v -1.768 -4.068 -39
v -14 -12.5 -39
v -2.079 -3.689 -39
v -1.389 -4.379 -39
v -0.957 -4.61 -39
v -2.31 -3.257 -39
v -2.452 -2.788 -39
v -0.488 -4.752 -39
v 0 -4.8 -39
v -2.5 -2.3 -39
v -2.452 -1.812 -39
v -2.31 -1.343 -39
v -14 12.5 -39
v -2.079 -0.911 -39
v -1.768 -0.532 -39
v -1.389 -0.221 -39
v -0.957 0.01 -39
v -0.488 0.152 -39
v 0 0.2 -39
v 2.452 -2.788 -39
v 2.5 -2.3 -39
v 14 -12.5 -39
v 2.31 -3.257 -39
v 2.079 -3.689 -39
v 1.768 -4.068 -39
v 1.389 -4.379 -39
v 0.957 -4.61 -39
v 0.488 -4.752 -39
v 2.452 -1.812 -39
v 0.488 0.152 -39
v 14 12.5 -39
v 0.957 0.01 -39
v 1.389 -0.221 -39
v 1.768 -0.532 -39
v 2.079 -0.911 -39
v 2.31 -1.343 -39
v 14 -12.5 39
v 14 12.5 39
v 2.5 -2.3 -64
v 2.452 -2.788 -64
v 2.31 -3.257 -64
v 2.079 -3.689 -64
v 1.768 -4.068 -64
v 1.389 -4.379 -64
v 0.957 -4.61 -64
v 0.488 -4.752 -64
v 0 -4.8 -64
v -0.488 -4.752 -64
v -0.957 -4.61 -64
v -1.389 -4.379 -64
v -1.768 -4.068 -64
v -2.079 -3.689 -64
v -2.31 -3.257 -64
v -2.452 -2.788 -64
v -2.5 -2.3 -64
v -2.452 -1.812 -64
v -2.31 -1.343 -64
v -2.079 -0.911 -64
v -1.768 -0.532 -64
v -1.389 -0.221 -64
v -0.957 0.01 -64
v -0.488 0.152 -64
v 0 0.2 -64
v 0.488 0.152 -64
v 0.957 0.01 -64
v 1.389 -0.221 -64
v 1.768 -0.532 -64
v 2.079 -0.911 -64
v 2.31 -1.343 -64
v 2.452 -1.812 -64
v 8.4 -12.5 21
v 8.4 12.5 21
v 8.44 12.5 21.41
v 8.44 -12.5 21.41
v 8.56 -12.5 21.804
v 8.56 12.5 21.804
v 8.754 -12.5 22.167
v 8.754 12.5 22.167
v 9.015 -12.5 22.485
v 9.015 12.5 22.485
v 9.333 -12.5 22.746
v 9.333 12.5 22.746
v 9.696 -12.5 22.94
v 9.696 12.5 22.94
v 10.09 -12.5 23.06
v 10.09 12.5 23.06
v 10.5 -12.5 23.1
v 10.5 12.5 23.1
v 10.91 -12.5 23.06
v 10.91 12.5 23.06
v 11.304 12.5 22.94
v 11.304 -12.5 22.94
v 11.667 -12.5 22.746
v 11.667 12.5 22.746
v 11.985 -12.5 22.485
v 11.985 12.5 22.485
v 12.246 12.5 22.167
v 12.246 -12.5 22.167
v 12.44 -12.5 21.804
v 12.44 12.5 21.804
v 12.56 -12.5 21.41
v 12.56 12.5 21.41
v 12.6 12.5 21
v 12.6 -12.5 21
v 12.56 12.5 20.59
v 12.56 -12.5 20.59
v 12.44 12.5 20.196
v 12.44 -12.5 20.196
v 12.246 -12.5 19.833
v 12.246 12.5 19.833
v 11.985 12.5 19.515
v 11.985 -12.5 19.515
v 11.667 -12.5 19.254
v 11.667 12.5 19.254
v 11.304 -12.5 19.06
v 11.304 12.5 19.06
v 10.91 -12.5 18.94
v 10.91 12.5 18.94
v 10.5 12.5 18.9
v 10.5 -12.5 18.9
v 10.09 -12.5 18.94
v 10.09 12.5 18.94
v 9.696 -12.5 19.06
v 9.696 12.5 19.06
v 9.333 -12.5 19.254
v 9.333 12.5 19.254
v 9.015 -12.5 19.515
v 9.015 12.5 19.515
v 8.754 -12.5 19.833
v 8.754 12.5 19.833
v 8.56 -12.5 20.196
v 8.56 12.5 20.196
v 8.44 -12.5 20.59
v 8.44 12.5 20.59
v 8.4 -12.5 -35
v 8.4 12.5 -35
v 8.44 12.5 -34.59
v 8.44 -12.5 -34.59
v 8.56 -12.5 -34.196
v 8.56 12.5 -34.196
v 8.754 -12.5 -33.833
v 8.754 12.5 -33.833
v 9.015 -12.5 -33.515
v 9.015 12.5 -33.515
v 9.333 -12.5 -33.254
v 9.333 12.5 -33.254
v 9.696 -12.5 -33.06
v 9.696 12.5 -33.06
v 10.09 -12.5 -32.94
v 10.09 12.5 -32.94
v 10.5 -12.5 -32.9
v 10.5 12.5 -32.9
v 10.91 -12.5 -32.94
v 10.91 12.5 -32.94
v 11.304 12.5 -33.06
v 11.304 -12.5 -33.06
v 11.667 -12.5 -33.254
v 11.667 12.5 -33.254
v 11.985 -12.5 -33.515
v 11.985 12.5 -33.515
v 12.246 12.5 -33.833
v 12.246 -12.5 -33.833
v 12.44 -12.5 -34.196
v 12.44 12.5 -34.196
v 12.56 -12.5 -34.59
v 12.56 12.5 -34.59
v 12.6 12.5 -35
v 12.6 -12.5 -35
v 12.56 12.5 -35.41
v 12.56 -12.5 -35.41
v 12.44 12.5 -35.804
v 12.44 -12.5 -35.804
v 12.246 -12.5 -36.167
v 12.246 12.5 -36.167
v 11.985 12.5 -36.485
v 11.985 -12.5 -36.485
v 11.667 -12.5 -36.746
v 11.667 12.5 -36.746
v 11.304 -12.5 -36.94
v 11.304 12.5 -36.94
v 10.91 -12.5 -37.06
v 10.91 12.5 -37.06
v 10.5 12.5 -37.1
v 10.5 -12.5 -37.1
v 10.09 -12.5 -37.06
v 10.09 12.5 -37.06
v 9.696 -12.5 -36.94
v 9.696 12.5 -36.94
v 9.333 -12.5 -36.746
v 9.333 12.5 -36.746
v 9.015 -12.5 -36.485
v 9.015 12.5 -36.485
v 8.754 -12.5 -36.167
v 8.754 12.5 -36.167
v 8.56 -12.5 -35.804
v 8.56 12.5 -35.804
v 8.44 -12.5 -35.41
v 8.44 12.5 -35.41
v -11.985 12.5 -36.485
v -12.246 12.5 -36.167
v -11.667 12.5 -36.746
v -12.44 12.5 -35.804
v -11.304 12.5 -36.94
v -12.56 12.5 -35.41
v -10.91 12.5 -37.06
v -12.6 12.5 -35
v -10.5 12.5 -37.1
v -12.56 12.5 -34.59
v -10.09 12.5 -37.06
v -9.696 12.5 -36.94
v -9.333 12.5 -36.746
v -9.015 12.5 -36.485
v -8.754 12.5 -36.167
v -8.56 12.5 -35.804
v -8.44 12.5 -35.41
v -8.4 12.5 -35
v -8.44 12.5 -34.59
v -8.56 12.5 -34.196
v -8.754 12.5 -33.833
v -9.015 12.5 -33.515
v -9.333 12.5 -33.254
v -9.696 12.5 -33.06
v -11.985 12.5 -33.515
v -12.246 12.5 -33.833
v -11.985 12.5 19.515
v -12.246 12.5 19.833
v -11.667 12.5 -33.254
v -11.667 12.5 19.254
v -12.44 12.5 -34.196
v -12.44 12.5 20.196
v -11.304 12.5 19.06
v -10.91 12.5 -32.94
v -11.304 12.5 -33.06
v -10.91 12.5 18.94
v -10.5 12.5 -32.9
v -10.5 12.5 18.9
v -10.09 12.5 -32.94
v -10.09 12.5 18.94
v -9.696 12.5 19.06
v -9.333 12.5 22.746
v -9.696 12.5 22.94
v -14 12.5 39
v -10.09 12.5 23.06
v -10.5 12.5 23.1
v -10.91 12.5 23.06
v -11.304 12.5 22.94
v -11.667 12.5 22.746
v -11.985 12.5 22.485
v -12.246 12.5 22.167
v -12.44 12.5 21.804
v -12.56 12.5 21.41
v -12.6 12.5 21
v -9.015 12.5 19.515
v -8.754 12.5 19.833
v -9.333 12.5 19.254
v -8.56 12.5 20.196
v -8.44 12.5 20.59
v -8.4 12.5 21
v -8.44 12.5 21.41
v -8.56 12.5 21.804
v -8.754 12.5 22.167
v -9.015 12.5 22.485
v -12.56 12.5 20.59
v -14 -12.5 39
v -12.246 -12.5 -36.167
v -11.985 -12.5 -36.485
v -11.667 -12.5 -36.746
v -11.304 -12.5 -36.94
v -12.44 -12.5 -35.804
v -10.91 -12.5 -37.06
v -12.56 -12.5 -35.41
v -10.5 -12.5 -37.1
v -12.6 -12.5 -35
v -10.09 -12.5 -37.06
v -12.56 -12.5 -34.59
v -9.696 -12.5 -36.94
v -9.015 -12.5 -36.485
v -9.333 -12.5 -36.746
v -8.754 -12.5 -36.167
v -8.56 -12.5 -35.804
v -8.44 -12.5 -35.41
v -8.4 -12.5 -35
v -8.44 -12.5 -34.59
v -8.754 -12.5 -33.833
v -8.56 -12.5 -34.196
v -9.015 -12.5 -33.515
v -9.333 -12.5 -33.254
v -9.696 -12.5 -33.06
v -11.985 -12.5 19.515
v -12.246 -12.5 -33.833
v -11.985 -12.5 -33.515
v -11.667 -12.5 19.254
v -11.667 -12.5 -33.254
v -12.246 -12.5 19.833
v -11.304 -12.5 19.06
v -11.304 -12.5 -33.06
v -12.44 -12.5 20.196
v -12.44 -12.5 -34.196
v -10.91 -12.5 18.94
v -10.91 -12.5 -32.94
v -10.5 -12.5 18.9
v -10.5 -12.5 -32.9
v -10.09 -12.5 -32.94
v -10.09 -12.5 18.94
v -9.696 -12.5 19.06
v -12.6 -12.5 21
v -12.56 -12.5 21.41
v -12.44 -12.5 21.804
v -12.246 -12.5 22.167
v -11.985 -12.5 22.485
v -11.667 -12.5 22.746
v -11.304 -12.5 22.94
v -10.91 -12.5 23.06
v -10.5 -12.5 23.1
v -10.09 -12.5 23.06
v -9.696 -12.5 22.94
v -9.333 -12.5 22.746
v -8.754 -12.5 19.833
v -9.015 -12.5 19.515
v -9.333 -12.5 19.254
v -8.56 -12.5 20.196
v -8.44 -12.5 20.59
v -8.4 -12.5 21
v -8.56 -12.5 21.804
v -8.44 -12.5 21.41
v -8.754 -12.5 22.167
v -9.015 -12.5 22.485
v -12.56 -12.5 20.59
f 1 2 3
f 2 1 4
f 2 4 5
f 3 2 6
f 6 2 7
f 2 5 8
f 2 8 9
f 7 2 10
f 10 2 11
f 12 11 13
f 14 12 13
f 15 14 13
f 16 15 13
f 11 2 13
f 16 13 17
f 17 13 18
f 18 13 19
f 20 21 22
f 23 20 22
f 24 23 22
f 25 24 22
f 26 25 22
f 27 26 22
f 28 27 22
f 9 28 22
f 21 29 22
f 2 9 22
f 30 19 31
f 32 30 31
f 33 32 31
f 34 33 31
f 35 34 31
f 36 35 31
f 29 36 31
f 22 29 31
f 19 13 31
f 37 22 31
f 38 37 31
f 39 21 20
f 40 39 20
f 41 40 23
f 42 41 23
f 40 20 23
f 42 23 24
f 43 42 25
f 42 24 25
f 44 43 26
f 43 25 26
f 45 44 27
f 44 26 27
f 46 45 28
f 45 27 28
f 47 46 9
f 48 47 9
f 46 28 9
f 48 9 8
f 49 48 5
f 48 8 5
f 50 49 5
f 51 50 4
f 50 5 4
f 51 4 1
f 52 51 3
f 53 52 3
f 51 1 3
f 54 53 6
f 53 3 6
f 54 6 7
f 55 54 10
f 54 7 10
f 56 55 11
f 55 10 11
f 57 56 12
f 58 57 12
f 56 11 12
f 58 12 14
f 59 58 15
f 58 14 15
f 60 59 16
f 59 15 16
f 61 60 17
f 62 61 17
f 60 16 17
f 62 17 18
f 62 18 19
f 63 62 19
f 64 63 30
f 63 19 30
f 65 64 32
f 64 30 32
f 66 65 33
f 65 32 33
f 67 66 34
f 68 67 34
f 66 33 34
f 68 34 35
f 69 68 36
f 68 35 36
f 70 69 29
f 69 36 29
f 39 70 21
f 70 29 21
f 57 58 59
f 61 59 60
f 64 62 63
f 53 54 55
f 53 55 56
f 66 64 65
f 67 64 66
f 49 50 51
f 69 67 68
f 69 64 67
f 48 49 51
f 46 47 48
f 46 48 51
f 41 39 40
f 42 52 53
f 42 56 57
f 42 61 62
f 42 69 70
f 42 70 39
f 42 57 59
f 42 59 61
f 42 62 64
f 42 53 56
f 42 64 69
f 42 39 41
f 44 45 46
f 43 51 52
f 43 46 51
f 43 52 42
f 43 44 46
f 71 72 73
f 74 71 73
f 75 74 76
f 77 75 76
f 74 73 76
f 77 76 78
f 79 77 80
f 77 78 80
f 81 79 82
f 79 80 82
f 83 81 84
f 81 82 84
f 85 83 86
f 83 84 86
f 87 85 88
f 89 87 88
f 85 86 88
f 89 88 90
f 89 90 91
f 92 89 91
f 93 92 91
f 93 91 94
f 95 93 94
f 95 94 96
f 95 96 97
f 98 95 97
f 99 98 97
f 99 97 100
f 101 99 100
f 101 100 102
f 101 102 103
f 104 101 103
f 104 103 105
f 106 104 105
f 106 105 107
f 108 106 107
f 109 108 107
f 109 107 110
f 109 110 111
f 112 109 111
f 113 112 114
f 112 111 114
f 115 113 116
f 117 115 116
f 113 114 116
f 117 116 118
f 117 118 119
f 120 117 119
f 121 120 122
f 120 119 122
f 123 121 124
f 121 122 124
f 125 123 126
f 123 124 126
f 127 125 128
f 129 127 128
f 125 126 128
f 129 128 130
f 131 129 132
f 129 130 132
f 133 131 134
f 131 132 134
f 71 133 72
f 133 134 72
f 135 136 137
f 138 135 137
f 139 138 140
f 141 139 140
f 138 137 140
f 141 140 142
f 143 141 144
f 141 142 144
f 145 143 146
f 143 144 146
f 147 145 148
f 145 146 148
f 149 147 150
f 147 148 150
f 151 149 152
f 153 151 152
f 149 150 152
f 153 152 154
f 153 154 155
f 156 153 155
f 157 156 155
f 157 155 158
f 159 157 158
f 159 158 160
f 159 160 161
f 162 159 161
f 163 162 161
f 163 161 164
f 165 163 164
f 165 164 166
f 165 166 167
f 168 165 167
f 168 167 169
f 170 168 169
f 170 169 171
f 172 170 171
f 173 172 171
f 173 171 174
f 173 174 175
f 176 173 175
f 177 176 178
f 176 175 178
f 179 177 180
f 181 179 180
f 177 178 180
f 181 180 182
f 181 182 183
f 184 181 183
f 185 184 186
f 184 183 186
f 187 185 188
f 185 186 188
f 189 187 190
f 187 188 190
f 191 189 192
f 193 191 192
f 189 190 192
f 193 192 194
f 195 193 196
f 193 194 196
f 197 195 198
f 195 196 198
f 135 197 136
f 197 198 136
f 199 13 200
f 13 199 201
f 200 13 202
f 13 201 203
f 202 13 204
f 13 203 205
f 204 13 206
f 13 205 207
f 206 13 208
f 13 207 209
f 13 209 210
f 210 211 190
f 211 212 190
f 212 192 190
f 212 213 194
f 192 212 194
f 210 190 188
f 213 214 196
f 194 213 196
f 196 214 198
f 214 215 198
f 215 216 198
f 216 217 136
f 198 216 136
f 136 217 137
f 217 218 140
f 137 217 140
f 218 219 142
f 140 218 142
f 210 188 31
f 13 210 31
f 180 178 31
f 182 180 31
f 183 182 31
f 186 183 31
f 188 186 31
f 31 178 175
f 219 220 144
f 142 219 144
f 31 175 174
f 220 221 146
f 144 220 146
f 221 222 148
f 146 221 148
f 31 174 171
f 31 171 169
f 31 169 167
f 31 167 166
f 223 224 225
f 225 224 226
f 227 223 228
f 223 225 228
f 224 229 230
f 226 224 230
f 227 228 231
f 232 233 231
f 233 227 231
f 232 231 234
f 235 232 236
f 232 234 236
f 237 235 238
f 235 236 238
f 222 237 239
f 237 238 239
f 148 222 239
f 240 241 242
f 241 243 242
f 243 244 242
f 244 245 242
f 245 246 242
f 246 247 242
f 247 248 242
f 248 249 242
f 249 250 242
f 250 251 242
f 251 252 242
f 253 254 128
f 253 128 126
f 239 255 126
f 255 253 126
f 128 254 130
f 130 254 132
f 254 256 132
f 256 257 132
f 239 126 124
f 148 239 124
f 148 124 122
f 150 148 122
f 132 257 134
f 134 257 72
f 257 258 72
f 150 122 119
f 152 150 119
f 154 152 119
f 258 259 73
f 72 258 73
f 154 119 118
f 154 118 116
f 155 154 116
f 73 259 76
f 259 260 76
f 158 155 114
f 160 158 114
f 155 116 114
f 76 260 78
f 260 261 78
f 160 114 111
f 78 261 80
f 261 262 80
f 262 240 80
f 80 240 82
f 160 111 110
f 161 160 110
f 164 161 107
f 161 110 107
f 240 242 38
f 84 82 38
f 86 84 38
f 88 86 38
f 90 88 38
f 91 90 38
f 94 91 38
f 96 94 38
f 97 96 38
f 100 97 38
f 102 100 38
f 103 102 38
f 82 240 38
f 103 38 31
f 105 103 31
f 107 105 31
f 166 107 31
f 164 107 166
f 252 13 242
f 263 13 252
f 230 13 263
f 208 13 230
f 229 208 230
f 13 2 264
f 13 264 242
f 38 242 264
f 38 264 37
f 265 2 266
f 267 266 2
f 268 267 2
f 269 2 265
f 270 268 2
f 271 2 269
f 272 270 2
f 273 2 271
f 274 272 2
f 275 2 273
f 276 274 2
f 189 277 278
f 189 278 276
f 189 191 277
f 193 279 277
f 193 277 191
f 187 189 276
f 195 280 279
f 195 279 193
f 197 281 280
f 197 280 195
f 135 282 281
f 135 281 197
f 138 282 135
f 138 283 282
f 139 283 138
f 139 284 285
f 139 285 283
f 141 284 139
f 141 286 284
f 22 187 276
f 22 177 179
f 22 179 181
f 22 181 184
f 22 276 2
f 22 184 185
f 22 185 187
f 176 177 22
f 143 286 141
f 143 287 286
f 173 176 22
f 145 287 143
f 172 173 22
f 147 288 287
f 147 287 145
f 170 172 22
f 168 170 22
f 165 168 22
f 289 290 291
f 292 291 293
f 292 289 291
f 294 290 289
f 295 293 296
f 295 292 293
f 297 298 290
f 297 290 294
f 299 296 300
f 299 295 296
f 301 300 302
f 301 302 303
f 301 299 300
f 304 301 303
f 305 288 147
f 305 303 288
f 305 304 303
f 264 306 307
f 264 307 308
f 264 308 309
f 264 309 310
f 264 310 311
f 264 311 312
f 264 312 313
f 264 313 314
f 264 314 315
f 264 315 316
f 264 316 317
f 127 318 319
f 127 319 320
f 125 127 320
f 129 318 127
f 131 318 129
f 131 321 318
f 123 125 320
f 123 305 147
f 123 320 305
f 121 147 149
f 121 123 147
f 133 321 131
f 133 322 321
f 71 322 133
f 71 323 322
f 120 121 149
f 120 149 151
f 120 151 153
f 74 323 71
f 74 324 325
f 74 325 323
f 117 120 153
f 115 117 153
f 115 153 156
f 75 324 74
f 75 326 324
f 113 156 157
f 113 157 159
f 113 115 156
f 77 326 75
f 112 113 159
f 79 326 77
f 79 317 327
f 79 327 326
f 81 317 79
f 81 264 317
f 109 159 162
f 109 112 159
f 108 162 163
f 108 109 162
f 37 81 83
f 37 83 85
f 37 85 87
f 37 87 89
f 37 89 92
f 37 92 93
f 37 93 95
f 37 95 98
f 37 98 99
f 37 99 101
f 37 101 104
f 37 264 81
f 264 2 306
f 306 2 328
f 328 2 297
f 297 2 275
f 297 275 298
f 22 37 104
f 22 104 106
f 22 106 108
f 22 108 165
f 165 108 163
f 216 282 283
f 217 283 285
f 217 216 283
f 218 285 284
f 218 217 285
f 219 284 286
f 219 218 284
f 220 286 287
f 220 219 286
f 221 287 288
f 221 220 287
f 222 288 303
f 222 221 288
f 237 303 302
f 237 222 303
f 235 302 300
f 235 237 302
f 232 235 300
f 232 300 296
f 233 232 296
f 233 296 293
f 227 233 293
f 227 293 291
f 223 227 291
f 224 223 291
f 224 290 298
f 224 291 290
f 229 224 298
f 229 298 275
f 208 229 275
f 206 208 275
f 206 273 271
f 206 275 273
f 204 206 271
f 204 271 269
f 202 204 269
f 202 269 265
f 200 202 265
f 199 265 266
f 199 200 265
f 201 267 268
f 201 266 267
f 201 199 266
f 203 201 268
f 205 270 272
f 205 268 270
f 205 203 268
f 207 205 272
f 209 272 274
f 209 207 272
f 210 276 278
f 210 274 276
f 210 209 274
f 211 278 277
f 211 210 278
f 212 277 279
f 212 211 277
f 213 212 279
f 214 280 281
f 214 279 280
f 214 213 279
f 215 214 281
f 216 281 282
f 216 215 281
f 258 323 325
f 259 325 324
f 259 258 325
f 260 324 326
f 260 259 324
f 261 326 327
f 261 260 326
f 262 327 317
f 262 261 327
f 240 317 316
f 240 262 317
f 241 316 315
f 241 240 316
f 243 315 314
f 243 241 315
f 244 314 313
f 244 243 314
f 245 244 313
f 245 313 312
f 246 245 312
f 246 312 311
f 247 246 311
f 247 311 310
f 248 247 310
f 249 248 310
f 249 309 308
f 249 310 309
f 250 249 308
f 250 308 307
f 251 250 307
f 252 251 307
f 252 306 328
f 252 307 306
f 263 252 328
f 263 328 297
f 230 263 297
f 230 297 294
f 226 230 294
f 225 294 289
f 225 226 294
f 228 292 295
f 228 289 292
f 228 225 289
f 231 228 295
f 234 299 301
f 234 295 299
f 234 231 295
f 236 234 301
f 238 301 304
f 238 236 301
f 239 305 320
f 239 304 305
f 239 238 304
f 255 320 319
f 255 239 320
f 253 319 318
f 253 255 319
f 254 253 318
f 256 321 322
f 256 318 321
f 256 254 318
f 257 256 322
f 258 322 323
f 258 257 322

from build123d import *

# Parameters (mm, degrees)
SKETCH1_W           = 28
SKETCH1_H           = 25
BOSS_EXTRUDE1_DEPTH = 39
SKETCH2_R           = 2.1
CUT_EXTRUDE1_DEPTH  = 49.39421453
SKETCH3_R           = 2.5
BOSS_EXTRUDE2_DEPTH = 25


with BuildPart() as part:
    # Sketch1 → Boss-Extrude1 (new, symmetric)
    with BuildSketch(Plane.XY):
        Rectangle(SKETCH1_W, SKETCH1_H)
    extrude(amount=BOSS_EXTRUDE1_DEPTH, both=True)

    # Sketch2 → Cut-Extrude1 (cut, through all)
    with BuildSketch(Plane(origin=(0, 12.5, 0), x_dir=(1, 0, 0), z_dir=(0, 1, 0))):
        with Locations(Location((10.5, 35, 0), (0, 0, 180))):
            Circle(SKETCH2_R)
        with Locations(Location((10.5, -21, 0), (0, 0, 180))):
            Circle(SKETCH2_R)
    cut_extrude1 = extrude(amount=-CUT_EXTRUDE1_DEPTH, mode=Mode.SUBTRACT)

    # Mirror1: Cut-Extrude1 across plane
    add(cut_extrude1.mirror(Plane(origin=(0, 0, 0), x_dir=(0, 0, 1), z_dir=(1, 0, 0))), mode=Mode.SUBTRACT)

    # Sketch3 → Boss-Extrude2 (add)
    with BuildSketch(Plane(origin=(0, 0, -39), x_dir=(-1, 0, 0), z_dir=(0, 0, -1))):
        with Locations(Location((0, -2.3, 0), (0, 0, 180))):
            Circle(SKETCH3_R)
    extrude(amount=BOSS_EXTRUDE2_DEPTH)


solid = part.part
